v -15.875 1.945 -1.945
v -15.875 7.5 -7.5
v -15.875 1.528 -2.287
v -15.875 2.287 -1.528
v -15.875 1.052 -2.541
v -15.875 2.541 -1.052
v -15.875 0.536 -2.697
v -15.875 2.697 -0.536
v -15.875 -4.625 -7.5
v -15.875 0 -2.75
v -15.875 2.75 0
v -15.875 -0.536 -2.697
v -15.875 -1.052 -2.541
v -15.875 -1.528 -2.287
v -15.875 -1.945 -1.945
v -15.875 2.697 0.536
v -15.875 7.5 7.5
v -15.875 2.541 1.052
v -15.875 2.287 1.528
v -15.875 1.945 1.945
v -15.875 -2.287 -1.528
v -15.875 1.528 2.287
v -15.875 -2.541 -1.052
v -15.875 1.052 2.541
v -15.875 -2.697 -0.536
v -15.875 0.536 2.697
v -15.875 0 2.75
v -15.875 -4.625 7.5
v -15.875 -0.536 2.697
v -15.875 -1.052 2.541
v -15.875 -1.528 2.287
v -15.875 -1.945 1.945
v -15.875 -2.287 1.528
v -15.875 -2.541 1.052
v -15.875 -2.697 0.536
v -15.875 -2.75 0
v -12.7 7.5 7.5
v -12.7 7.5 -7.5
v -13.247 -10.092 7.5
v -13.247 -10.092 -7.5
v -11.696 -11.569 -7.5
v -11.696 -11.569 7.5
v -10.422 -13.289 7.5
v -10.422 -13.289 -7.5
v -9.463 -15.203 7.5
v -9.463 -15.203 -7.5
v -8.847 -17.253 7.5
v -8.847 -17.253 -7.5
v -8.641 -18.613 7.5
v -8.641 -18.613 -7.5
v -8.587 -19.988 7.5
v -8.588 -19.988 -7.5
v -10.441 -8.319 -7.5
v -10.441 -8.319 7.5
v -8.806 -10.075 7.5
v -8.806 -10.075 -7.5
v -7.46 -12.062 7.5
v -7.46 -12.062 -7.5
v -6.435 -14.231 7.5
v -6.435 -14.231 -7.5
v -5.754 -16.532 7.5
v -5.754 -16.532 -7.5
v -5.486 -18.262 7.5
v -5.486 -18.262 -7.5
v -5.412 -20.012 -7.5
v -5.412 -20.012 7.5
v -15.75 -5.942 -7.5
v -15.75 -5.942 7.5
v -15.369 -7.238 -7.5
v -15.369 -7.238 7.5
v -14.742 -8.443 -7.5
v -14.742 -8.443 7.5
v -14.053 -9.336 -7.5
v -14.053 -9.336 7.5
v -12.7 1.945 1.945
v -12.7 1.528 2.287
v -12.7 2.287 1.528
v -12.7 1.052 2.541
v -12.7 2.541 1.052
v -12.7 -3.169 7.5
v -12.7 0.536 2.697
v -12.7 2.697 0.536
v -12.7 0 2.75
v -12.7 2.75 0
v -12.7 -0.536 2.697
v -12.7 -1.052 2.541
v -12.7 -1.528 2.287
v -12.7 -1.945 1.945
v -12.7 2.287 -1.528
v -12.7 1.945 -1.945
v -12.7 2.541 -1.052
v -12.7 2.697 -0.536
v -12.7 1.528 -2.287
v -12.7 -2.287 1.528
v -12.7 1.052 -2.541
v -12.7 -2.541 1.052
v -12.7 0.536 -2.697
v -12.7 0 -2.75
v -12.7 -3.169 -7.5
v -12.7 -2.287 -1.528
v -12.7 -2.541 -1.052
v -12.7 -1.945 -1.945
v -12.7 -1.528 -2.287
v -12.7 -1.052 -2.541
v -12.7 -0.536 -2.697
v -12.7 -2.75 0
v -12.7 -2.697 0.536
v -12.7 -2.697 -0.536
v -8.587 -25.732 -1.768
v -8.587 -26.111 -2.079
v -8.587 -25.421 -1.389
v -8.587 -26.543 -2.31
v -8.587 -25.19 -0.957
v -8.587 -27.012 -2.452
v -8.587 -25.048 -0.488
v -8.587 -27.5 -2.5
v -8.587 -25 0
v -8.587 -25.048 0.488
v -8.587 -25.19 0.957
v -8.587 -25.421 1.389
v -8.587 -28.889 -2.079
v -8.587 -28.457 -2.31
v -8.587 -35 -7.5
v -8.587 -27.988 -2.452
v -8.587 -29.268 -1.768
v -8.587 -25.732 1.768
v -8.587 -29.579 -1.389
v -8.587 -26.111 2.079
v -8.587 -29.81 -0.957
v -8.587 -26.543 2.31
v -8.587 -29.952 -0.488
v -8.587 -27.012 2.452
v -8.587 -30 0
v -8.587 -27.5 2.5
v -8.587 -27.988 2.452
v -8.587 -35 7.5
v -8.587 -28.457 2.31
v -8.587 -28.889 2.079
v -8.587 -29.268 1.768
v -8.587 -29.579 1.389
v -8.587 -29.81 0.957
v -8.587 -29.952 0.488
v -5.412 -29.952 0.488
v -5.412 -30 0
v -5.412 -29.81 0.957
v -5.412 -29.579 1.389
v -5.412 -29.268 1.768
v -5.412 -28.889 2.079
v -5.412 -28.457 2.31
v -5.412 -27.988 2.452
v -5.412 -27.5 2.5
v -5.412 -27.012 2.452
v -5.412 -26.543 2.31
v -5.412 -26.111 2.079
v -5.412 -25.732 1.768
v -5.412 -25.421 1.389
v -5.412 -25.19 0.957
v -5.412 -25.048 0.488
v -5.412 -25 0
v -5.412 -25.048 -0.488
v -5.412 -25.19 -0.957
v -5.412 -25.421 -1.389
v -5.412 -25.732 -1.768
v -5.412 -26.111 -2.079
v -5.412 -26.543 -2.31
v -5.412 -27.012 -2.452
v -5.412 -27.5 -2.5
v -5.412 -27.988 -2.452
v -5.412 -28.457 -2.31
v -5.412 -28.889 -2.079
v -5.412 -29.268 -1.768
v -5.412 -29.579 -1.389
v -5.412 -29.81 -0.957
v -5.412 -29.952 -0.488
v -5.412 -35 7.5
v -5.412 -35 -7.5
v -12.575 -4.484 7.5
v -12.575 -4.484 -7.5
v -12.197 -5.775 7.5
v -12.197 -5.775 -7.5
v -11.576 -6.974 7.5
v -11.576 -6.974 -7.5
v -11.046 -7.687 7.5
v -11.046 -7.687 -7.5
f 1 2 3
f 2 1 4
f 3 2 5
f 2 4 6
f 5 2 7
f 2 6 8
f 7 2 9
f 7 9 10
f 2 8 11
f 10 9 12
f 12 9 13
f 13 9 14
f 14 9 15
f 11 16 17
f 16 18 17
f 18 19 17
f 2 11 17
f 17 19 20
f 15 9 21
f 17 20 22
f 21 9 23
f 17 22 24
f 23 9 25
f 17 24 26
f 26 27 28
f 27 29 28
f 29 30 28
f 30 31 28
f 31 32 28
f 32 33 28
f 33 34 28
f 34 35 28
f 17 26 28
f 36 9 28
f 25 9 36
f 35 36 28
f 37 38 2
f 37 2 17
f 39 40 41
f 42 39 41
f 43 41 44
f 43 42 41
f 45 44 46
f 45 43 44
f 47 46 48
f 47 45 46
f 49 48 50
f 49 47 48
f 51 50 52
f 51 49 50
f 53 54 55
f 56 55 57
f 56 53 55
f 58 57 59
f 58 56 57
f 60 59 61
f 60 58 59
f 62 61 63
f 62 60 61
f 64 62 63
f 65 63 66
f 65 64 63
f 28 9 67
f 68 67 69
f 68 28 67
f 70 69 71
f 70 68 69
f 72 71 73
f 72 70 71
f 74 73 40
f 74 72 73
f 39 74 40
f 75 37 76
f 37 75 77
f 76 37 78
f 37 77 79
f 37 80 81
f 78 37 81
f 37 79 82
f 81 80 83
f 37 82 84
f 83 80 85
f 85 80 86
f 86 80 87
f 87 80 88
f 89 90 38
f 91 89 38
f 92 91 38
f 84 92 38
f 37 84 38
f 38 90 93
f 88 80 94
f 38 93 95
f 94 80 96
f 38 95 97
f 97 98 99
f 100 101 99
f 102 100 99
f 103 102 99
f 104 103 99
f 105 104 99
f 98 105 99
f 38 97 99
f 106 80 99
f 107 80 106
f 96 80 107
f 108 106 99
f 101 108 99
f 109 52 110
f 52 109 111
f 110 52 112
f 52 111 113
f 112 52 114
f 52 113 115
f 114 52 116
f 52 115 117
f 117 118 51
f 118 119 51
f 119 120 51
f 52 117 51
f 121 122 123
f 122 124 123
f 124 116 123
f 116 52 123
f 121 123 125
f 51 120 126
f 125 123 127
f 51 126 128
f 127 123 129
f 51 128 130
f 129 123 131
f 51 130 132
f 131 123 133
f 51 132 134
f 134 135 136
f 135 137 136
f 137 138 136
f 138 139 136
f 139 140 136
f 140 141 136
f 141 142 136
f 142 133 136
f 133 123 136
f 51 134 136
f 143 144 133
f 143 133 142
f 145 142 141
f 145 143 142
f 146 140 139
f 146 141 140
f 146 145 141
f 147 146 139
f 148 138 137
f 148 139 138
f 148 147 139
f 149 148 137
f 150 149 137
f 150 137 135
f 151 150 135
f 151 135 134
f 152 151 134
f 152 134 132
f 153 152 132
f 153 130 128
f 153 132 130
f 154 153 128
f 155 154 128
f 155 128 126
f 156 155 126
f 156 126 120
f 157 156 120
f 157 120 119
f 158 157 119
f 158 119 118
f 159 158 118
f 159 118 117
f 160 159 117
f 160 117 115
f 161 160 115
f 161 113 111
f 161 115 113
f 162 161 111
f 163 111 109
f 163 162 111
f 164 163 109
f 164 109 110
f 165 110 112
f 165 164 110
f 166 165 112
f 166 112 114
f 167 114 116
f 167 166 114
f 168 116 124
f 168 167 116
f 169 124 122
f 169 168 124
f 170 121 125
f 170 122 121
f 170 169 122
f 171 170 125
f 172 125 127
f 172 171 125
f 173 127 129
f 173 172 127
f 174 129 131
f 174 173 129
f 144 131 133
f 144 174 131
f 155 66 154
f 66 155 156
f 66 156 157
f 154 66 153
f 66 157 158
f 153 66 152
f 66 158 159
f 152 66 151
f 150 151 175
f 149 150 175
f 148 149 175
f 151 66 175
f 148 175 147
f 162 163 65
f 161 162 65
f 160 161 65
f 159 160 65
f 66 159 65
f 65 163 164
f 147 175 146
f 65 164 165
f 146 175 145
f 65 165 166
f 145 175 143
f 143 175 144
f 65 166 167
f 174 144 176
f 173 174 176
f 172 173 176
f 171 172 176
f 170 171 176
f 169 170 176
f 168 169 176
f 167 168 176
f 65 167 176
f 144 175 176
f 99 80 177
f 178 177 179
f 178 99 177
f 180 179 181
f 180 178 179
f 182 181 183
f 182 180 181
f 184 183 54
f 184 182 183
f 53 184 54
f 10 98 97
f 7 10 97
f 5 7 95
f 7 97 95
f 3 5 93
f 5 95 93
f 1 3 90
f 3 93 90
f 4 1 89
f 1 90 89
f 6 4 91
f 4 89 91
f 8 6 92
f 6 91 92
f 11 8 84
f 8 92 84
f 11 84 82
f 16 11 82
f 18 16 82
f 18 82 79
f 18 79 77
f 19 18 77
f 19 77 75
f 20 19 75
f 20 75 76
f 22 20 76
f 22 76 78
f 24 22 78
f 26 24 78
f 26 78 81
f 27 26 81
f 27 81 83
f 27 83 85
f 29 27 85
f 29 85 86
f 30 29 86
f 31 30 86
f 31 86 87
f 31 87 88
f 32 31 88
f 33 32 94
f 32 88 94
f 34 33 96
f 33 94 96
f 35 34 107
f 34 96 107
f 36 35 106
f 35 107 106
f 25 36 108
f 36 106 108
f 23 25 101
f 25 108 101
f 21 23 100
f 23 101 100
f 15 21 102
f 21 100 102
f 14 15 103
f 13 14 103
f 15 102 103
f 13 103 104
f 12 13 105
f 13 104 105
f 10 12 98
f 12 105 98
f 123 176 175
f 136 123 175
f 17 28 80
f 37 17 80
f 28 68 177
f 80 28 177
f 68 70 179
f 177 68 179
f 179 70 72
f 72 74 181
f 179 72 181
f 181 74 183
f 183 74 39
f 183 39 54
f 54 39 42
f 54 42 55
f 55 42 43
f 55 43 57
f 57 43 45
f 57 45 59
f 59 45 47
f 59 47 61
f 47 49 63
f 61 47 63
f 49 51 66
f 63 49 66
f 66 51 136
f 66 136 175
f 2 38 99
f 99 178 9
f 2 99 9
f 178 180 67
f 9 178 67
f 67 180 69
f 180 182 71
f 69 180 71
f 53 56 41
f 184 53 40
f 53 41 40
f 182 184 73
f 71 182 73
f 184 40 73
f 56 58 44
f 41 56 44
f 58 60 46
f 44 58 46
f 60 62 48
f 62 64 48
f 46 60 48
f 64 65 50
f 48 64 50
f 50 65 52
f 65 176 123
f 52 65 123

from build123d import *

# Parameters (mm, degrees)
FILLET1_R               = 7
M5_CLEARANCE_HOLE1_D    = 5.5
CUT_EXTRUDE1_DEPTH      = 37.52886072966826
CUT_EXTRUDE1_DEPTH_BACK = 37.52886072966826
SKETCH3_R               = 2.4999999999999996


with BuildPart() as part:
    # Sweep1: sweep along a path in Sketch1
    with BuildLine(Plane.XY) as sweep1_path:
        Line((-14.2875, 7.5), (-14.2875, -7.5))
        ThreePointArc((-14.2875, -7.5), (-8.903716825795872, -12.735560659438995), (-7.000000000000001, -20))
        Line((-7.000000000000001, -20), (-6.999999999999999, -35))
    # Sketch2 → Sweep1 (sweep)
    with BuildSketch(Plane(origin=(0, 0, 0), x_dir=(1, 0, 0), z_dir=(0, 1, 0))):
        Polygon((-12.699999999999996, -7.499999999999996), (-15.874999999999996, -7.499999999999996), (-15.874999999999996, 7.500000000000004), (-12.699999999999996, 7.500000000000005), align=None)
    sweep(path=sweep1_path.line, transition=Transition.RIGHT)

    # Fillet1
    fillet1_edges = [part.edges().sort_by_distance(p)[0] for p in [
        (-15.874999999999996, -8.441785890670294, -1.599e-14),
        (-12.699999999999996, -6.5917812273426035, -7.11e-15),
    ]]
    fillet(fillet1_edges, radius=FILLET1_R)

    # M5 Clearance Hole1 (through all)
    with Locations(Plane.ZY.offset(15.874999999999996)):
        with Locations((0, 0)):
            Hole(M5_CLEARANCE_HOLE1_D / 2)

    # Sketch3 → Cut-Extrude1 (cut, two sides: drawn at the far end of the back side and taken through both)
    with BuildSketch(Plane.ZY.offset(8.587500000000007).offset(-CUT_EXTRUDE1_DEPTH_BACK)):
        with Locations(Location((0, -27.500000000000004, 0), (0, 0, 270))):
            Circle(SKETCH3_R)
    extrude(amount=CUT_EXTRUDE1_DEPTH + CUT_EXTRUDE1_DEPTH_BACK, mode=Mode.SUBTRACT)


solid = part.part
